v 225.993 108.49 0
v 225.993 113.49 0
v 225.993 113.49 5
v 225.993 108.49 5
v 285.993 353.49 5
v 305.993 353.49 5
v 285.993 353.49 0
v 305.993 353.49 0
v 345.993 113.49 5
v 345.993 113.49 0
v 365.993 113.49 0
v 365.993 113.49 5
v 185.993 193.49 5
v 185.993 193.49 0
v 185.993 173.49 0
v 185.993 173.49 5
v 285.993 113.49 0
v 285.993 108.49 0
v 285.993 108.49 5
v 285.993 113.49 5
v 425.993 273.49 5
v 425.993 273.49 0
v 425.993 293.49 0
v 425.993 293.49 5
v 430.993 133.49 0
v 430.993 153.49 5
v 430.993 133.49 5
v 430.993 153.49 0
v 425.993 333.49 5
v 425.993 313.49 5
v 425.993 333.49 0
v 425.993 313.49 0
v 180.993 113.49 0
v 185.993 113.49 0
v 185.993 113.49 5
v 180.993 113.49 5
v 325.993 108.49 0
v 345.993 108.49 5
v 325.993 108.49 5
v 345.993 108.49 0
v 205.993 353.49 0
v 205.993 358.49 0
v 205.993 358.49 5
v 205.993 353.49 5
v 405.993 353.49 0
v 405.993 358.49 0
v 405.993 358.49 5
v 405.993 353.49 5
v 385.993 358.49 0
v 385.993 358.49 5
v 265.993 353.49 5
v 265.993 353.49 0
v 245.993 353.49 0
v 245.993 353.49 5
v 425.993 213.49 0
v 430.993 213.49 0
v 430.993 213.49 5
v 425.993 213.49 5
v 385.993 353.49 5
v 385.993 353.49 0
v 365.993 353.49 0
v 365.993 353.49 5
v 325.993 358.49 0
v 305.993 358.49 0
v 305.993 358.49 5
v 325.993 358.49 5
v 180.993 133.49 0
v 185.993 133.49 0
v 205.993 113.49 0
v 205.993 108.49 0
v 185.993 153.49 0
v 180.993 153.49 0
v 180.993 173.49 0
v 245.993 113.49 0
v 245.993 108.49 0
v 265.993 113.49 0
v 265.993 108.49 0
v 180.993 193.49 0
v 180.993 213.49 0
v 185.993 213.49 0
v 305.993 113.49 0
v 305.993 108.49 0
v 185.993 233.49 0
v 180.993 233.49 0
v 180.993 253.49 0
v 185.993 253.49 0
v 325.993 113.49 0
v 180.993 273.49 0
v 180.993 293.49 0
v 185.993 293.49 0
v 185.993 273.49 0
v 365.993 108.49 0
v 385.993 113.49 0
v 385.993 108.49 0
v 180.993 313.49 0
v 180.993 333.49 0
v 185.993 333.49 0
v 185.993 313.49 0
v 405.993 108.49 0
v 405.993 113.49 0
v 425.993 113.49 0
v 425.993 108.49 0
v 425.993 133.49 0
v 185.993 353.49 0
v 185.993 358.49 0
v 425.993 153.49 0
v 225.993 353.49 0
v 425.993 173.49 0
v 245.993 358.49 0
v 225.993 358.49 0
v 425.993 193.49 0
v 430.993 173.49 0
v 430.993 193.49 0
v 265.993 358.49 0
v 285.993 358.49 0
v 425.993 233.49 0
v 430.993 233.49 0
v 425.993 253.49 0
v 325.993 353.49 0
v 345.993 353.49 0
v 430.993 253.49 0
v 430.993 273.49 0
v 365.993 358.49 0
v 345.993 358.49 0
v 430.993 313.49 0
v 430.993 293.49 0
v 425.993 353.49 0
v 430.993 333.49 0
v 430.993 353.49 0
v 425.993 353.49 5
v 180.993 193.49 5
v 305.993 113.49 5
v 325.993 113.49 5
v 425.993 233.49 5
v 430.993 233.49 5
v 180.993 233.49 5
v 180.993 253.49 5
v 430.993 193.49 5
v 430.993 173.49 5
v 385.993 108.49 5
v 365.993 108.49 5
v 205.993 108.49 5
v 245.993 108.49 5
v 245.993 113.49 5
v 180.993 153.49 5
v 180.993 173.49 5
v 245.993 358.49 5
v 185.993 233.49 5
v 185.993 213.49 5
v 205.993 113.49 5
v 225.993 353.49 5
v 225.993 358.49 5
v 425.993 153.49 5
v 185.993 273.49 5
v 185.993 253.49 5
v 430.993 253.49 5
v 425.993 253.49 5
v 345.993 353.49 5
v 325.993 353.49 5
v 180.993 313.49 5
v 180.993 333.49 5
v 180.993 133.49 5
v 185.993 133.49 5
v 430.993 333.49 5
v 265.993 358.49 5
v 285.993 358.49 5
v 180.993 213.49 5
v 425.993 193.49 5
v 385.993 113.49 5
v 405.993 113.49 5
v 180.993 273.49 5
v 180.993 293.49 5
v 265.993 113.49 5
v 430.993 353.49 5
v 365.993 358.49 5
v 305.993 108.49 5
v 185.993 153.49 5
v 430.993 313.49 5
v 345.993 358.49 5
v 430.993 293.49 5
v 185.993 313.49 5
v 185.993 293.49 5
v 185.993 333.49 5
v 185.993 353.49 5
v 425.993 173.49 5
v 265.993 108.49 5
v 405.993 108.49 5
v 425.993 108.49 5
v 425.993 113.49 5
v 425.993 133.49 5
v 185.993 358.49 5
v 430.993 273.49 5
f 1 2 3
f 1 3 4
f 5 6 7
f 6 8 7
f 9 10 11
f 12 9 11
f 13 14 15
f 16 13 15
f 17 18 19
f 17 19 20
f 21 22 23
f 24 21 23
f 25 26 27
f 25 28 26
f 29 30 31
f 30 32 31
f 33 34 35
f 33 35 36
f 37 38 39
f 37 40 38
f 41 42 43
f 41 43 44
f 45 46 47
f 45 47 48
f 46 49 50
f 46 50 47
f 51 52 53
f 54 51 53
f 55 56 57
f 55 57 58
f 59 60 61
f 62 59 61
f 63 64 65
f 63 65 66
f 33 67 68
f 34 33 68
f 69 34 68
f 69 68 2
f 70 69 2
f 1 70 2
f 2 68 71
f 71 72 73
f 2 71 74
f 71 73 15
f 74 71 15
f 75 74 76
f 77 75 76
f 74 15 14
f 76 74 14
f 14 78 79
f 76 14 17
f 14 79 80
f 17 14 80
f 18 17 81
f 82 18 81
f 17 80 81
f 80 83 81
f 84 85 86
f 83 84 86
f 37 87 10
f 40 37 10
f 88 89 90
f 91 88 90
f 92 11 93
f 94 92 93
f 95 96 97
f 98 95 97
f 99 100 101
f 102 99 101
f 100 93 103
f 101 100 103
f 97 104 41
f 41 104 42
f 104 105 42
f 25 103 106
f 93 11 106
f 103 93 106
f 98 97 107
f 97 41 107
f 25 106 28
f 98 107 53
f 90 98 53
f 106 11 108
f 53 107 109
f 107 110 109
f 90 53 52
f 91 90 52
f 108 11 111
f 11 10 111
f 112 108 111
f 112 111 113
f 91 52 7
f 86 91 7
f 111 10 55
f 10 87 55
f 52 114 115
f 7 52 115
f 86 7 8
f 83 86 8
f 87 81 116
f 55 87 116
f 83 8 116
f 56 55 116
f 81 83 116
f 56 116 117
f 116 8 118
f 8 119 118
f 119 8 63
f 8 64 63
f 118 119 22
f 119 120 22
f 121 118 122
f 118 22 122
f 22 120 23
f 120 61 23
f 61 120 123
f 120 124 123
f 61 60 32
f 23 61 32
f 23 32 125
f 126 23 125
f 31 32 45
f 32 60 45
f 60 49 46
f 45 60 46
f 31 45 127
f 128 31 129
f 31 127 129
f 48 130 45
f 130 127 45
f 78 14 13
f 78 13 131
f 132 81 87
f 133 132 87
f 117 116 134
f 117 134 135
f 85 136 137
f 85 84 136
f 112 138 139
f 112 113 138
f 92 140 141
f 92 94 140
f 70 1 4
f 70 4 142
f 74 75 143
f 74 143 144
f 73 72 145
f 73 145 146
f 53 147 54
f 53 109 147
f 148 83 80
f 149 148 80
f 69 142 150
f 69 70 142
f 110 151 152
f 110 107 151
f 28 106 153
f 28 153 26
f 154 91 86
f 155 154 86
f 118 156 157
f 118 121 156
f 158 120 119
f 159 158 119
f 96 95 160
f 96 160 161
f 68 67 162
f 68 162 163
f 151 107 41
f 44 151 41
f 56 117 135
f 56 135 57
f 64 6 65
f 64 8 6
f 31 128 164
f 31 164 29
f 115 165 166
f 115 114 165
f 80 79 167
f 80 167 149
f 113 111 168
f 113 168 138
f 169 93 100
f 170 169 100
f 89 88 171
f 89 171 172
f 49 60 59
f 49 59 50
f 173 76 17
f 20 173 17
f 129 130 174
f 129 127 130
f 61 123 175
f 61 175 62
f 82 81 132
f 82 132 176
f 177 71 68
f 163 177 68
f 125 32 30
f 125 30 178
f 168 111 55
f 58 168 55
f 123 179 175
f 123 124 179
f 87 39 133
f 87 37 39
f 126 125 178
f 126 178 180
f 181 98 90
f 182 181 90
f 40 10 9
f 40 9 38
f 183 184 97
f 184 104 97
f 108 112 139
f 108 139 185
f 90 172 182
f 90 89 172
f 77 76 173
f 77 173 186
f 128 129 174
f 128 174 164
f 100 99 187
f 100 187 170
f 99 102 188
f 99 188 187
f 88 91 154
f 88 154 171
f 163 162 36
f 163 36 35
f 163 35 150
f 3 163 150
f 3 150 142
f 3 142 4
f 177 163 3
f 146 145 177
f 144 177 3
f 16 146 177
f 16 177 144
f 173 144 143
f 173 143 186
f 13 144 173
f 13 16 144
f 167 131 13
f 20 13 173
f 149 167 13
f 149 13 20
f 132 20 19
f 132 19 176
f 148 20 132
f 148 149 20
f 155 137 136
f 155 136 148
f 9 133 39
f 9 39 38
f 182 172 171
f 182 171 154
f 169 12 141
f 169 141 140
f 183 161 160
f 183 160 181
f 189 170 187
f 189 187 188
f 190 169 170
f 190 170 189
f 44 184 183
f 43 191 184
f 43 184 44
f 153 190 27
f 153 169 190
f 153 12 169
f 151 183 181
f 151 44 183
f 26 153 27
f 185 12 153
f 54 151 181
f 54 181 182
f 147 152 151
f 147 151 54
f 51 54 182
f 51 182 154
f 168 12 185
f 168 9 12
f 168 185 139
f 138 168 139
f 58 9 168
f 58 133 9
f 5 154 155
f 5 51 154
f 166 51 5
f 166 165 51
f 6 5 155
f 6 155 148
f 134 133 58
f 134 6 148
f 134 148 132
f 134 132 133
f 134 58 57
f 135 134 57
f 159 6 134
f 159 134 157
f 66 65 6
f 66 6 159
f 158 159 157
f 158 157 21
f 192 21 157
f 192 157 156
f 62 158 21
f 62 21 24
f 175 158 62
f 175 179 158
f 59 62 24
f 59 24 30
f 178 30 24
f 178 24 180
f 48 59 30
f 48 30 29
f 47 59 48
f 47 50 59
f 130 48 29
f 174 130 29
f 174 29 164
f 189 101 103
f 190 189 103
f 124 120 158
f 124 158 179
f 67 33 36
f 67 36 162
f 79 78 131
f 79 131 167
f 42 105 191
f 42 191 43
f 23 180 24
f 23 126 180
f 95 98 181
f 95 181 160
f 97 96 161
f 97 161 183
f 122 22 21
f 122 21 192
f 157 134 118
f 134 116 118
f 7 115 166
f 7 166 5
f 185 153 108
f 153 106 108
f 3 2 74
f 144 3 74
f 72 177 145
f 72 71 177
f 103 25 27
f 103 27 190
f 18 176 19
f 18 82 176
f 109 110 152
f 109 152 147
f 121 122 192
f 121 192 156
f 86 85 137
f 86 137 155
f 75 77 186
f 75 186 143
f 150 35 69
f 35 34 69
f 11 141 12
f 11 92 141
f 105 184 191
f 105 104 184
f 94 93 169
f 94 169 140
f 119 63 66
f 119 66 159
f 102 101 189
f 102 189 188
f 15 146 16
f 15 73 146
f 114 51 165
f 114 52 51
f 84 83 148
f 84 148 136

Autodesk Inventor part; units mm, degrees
ref_plane "YZ Plane" through (0, 0, 0) normal (1, 0, 0) x (0, 1, 0)
ref_plane "XZ Plane" through (0, 0, 0) normal (0, 1, 0) x (-1, 0, 0)
ref_plane "XY Plane" through (0, 0, 0) normal (0, 0, 1) x (1, 0, 0)
sketch "Sketch1" plane through (0, 0, 0) normal (0, 0, 1) x (1, 0, 0)
  line L0 (425.9934, 353.49) -> (405.9934, 353.49)
  line L1 (185.9934, 353.49) -> (185.9934, 358.49)
  line L2 (185.9934, 358.49) -> (205.9934, 358.49)
  line L3 (205.9934, 358.49) -> (205.9934, 353.49)
  line L4 (225.9934, 353.49) -> (225.9934, 358.49)
  line L5 (225.9934, 358.49) -> (245.9934, 358.49)
  line L6 (245.9934, 358.49) -> (245.9934, 353.49)
  line L7 (265.9934, 353.49) -> (265.9934, 358.49)
  line L8 (265.9934, 358.49) -> (285.9934, 358.49)
  line L9 (285.9934, 358.49) -> (285.9934, 353.49)
  line L10 (305.9934, 353.49) -> (305.9934, 358.49)
  line L11 (305.9934, 358.49) -> (325.9934, 358.49)
  line L12 (325.9934, 358.49) -> (325.9934, 353.49)
  line L13 (345.9934, 353.49) -> (345.9934, 358.49)
  line L14 (345.9934, 358.49) -> (365.9934, 358.49)
  line L15 (365.9934, 358.49) -> (365.9934, 353.49)
  line L16 (385.9934, 353.49) -> (385.9934, 358.49)
  line L17 (385.9934, 358.49) -> (405.9934, 358.49)
  line L18 (405.9934, 358.49) -> (405.9934, 353.49)
  line L19 (385.9934, 353.49) -> (365.9934, 353.49)
  line L20 (345.9934, 353.49) -> (325.9934, 353.49)
  line L21 (305.9934, 353.49) -> (285.9934, 353.49)
  line L22 (265.9934, 353.49) -> (245.9934, 353.49)
  line L23 (225.9934, 353.49) -> (205.9934, 353.49)
  line L24 (425.9934, 113.49) -> (425.9934, 133.49)
  line L25 (425.9934, 353.49) -> (430.9934, 353.49)
  line L26 (430.9934, 353.49) -> (430.9934, 333.49)
  line L27 (430.9934, 333.49) -> (425.9934, 333.49)
  line L28 (425.9934, 313.49) -> (430.9934, 313.49)
  line L29 (430.9934, 313.49) -> (430.9934, 293.49)
  line L30 (430.9934, 293.49) -> (425.9934, 293.49)
  line L31 (425.9934, 273.49) -> (430.9934, 273.49)
  line L32 (430.9934, 273.49) -> (430.9934, 253.49)
  line L33 (430.9934, 253.49) -> (425.9934, 253.49)
  line L34 (425.9934, 233.49) -> (430.9934, 233.49)
  line L35 (430.9934, 233.49) -> (430.9934, 213.49)
  line L36 (430.9934, 213.49) -> (425.9934, 213.49)
  line L37 (425.9934, 193.49) -> (430.9934, 193.49)
  line L38 (430.9934, 193.49) -> (430.9934, 173.49)
  line L39 (430.9934, 173.49) -> (425.9934, 173.49)
  line L40 (425.9934, 153.49) -> (430.9934, 153.49)
  line L41 (430.9934, 153.49) -> (430.9934, 133.49)
  line L42 (430.9934, 133.49) -> (425.9934, 133.49)
  line L43 (425.9934, 153.49) -> (425.9934, 173.49)
  line L44 (425.9934, 193.49) -> (425.9934, 213.49)
  line L45 (425.9934, 233.49) -> (425.9934, 253.49)
  line L46 (425.9934, 273.49) -> (425.9934, 293.49)
  line L47 (425.9934, 313.49) -> (425.9934, 333.49)
  line L48 (185.9934, 353.49) -> (185.9934, 333.49)
  line L49 (185.9934, 113.49) -> (180.9934, 113.49)
  line L50 (180.9934, 113.49) -> (180.9934, 133.49)
  line L51 (180.9934, 133.49) -> (185.9934, 133.49)
  line L52 (185.9934, 153.49) -> (180.9934, 153.49)
  line L53 (180.9934, 153.49) -> (180.9934, 173.49)
  line L54 (180.9934, 173.49) -> (185.9934, 173.49)
  line L55 (185.9934, 193.49) -> (180.9934, 193.49)
  line L56 (180.9934, 193.49) -> (180.9934, 213.49)
  line L57 (180.9934, 213.49) -> (185.9934, 213.49)
  line L58 (185.9934, 233.49) -> (180.9934, 233.49)
  line L59 (180.9934, 233.49) -> (180.9934, 253.49)
  line L60 (180.9934, 253.49) -> (185.9934, 253.49)
  line L61 (185.9934, 273.49) -> (180.9934, 273.49)
  line L62 (180.9934, 273.49) -> (180.9934, 293.49)
  line L63 (180.9934, 293.49) -> (185.9934, 293.49)
  line L64 (185.9934, 313.49) -> (180.9934, 313.49)
  line L65 (180.9934, 313.49) -> (180.9934, 333.49)
  line L66 (180.9934, 333.49) -> (185.9934, 333.49)
  line L67 (185.9934, 313.49) -> (185.9934, 293.49)
  line L68 (185.9934, 273.49) -> (185.9934, 253.49)
  line L69 (185.9934, 233.49) -> (185.9934, 213.49)
  line L70 (185.9934, 193.49) -> (185.9934, 173.49)
  line L71 (185.9934, 153.49) -> (185.9934, 133.49)
  line L72 (185.9934, 113.49) -> (205.9934, 113.49)
  line L73 (425.9934, 113.49) -> (425.9934, 108.49)
  line L74 (425.9934, 108.49) -> (405.9934, 108.49)
  line L75 (405.9934, 108.49) -> (405.9934, 113.49)
  line L76 (385.9934, 113.49) -> (385.9934, 108.49)
  line L77 (385.9934, 108.49) -> (365.9934, 108.49)
  line L78 (365.9934, 108.49) -> (365.9934, 113.49)
  line L79 (345.9934, 113.49) -> (345.9934, 108.49)
  line L80 (345.9934, 108.49) -> (325.9934, 108.49)
  line L81 (325.9934, 108.49) -> (325.9934, 113.49)
  line L82 (305.9934, 113.49) -> (305.9934, 108.49)
  line L83 (305.9934, 108.49) -> (285.9934, 108.49)
  line L84 (285.9934, 108.49) -> (285.9934, 113.49)
  line L85 (265.9934, 113.49) -> (265.9934, 108.49)
  line L86 (265.9934, 108.49) -> (245.9934, 108.49)
  line L87 (245.9934, 108.49) -> (245.9934, 113.49)
  line L88 (225.9934, 113.49) -> (225.9934, 108.49)
  line L89 (225.9934, 108.49) -> (205.9934, 108.49)
  line L90 (205.9934, 108.49) -> (205.9934, 113.49)
  line L91 (225.9934, 113.49) -> (245.9934, 113.49)
  line L92 (265.9934, 113.49) -> (285.9934, 113.49)
  line L93 (305.9934, 113.49) -> (325.9934, 113.49)
  line L94 (345.9934, 113.49) -> (365.9934, 113.49)
  line L95 (385.9934, 113.49) -> (405.9934, 113.49)
  point P0 (0, 0)
extrude "Extrusion1" add sketch "Sketch1" along normal blind 5
sketch "Sketch2" plane through (0, 0, 5) normal (0, 0, 1) x (1, 0, 0)
  point P0 (0, 0)
properties material "Glass"
